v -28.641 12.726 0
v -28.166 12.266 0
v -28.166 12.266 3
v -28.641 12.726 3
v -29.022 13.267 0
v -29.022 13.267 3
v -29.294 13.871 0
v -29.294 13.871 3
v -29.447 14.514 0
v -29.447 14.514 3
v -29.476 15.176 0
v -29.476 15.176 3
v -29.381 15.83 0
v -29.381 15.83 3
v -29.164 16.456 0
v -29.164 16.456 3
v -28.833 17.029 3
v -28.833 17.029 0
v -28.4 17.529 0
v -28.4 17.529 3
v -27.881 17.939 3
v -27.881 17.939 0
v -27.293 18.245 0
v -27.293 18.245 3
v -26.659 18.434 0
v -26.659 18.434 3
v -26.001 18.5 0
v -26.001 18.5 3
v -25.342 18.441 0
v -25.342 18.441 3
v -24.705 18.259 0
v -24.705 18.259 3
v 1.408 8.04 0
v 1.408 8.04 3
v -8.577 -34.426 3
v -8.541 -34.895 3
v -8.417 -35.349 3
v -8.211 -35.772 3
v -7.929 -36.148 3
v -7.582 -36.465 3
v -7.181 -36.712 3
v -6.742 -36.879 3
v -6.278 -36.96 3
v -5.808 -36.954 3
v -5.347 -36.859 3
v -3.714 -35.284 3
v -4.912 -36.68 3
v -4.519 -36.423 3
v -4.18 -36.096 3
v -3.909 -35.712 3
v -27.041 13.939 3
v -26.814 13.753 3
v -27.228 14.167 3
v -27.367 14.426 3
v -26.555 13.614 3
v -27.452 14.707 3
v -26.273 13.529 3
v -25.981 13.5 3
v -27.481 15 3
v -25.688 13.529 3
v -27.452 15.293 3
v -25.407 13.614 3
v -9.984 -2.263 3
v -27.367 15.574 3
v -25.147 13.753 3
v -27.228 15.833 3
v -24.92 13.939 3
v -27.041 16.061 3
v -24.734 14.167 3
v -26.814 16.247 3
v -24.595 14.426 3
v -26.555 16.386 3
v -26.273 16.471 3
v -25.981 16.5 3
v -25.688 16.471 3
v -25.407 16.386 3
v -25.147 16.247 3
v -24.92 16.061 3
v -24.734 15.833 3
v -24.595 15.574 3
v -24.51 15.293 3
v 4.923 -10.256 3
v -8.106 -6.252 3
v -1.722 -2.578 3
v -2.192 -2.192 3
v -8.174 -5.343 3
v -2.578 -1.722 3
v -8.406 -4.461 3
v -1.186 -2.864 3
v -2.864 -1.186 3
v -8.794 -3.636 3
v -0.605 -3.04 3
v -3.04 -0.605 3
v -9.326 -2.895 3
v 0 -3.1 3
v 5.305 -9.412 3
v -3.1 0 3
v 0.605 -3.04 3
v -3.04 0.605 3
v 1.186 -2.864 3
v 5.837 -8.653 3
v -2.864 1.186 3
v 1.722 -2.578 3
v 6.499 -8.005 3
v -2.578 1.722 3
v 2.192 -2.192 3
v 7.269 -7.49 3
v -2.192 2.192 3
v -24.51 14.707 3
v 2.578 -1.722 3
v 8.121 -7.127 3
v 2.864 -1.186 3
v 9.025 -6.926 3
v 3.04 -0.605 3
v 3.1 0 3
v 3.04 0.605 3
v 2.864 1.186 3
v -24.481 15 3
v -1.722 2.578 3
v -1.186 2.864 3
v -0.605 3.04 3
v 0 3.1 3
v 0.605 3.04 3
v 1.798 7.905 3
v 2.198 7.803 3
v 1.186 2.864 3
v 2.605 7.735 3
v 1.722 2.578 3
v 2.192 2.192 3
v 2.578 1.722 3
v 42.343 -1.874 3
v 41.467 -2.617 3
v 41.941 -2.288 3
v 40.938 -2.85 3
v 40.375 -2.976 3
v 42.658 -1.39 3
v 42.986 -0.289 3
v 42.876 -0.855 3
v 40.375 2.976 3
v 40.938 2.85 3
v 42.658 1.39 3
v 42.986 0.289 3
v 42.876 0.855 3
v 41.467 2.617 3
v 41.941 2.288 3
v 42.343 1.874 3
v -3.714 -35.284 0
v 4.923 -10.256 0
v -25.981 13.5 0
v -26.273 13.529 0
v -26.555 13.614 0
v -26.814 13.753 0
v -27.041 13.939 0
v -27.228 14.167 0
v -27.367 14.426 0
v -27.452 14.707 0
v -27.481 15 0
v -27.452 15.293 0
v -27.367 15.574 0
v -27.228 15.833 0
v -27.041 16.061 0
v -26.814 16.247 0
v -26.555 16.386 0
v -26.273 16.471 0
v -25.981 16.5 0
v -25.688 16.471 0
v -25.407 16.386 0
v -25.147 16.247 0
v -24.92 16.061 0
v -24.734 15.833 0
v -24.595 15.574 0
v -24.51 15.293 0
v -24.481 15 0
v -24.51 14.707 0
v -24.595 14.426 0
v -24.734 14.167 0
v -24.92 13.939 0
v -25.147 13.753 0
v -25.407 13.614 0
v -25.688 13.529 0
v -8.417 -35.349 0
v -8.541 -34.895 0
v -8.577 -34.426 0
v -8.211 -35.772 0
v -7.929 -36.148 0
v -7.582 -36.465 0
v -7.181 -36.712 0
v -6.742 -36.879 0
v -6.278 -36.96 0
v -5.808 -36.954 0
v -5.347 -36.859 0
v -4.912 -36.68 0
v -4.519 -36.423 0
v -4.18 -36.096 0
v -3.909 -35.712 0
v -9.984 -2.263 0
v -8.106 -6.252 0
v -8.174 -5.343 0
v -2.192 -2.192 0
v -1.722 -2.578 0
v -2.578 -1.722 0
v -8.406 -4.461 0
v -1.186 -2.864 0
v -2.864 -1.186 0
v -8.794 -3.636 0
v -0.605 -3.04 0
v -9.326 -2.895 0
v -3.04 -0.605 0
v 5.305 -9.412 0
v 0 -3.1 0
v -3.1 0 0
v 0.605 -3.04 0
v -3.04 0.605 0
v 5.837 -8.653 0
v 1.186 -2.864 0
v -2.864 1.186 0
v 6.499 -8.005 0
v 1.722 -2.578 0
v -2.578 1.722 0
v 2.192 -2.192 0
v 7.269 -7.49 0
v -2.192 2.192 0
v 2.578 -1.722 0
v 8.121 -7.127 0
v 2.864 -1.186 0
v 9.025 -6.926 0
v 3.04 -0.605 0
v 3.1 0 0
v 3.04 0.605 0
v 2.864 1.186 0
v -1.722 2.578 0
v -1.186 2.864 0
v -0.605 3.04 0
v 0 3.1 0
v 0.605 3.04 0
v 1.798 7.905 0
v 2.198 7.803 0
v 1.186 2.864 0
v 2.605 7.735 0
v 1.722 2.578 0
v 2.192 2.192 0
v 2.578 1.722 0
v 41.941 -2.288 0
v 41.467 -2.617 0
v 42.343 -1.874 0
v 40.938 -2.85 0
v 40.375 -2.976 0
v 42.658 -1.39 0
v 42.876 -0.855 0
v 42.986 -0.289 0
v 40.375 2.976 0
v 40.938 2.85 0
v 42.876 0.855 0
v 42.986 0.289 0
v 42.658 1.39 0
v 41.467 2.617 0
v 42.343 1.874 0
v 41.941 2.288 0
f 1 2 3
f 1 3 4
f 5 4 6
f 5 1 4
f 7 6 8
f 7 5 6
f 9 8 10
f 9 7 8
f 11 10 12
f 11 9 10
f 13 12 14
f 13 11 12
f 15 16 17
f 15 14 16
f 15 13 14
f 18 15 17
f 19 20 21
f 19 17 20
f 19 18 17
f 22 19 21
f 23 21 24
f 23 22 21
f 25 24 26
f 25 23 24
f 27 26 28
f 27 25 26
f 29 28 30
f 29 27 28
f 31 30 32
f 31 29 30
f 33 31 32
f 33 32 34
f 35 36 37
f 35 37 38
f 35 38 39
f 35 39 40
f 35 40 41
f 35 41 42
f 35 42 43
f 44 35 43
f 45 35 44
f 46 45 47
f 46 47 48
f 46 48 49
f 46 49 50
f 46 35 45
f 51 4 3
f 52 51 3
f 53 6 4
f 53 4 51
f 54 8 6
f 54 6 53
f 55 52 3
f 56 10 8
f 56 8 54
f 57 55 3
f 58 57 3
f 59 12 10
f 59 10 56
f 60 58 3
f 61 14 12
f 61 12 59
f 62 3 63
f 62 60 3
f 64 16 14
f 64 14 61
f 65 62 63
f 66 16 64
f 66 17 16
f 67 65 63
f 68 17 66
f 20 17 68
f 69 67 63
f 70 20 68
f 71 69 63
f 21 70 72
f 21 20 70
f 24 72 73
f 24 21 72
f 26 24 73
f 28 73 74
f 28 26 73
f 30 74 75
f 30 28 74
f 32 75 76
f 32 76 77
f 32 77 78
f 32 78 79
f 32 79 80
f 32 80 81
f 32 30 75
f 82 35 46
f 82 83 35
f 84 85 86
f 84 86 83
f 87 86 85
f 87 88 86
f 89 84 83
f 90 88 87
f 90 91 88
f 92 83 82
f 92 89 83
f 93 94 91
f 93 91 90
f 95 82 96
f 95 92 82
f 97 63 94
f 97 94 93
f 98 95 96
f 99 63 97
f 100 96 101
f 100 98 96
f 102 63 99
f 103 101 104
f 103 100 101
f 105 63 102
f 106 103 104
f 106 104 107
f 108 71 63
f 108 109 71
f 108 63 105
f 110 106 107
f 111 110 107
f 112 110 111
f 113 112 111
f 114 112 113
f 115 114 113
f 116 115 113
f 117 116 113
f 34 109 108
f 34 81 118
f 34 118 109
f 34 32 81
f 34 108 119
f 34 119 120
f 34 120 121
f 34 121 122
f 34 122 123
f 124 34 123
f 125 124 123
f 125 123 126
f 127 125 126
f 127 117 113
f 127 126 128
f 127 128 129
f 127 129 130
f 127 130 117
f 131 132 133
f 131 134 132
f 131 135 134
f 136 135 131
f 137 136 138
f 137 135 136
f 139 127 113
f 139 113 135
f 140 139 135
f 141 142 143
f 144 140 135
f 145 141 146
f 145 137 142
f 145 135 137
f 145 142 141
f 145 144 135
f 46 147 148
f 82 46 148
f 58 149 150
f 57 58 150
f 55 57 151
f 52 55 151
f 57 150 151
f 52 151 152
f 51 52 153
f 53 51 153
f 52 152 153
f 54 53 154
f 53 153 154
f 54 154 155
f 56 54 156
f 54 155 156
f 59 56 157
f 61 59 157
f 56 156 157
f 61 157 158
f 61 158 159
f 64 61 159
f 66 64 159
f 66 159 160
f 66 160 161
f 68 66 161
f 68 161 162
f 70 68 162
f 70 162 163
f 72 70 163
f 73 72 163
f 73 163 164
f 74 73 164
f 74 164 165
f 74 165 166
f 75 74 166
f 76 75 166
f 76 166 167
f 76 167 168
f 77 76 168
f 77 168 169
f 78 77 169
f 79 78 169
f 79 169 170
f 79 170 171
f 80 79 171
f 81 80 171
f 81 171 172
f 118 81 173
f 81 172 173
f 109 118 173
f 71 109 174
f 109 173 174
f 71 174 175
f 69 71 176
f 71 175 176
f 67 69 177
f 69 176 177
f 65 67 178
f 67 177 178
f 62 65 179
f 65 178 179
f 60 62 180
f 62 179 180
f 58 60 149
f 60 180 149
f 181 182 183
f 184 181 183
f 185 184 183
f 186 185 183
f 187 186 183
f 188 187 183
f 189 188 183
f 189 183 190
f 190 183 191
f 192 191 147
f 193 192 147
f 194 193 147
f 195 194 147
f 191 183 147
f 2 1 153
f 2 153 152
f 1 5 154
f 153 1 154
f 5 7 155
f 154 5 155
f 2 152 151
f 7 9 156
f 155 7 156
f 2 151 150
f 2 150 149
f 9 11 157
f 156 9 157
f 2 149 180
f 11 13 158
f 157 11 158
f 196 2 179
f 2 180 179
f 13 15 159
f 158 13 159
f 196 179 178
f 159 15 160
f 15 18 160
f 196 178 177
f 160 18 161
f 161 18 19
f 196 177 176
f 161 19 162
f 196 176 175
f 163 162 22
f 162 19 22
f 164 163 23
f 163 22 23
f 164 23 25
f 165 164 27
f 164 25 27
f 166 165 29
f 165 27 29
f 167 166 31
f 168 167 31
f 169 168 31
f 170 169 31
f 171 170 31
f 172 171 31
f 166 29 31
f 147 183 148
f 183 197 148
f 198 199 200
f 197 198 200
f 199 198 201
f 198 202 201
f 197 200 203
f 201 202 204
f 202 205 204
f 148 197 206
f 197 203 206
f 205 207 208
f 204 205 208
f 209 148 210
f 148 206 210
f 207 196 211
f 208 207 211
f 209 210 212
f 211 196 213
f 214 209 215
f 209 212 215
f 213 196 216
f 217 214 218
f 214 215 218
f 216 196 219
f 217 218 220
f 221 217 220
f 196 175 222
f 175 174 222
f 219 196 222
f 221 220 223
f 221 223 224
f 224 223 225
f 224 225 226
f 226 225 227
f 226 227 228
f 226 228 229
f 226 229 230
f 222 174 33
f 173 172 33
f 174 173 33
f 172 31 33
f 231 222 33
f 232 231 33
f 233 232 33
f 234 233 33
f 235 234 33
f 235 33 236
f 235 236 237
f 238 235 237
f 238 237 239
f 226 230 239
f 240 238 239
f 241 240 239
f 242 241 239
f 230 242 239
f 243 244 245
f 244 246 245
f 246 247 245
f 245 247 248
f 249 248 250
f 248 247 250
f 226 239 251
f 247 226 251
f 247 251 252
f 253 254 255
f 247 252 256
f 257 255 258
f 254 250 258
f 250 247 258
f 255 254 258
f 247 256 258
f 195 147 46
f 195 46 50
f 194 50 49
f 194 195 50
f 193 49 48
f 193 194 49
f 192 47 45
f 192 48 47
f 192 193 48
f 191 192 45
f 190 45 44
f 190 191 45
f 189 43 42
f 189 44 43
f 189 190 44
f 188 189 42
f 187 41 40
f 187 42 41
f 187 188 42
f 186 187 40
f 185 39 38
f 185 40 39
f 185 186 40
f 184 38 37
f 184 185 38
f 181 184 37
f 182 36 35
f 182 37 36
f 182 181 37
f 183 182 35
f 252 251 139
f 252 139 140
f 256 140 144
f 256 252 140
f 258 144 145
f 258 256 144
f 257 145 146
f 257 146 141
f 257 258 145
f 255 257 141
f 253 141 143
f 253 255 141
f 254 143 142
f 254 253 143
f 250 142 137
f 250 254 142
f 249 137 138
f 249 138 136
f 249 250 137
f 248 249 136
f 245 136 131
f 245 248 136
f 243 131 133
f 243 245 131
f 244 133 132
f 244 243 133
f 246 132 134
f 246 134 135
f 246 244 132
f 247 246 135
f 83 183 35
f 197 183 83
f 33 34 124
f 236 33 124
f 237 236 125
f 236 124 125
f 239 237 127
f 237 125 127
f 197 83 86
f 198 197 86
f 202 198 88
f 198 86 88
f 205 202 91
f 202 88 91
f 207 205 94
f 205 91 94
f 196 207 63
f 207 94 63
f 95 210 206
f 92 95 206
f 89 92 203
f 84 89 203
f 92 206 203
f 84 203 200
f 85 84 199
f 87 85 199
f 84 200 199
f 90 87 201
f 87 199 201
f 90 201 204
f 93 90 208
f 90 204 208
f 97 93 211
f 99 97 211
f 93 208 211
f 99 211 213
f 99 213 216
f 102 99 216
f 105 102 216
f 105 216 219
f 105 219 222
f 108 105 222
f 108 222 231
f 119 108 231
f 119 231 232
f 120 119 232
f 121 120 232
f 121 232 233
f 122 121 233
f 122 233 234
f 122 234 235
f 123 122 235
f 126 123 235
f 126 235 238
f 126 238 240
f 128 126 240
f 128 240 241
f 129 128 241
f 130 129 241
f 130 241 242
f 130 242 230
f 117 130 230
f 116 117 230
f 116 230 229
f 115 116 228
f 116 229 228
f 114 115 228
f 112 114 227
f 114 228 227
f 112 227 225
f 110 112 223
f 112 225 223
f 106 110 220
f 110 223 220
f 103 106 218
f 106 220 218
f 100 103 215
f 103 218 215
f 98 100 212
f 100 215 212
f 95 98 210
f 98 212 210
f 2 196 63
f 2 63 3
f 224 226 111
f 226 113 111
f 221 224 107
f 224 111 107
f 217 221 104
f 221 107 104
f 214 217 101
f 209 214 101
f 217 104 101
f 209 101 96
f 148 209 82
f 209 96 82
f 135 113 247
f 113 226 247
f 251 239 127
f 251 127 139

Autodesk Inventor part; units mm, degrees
ref_plane "YZ Plane" through (0, 0, 0) normal (1, 0, 0) x (0, 1, 0)
ref_plane "XZ Plane" through (0, 0, 0) normal (0, 1, 0) x (-1, 0, 0)
ref_plane "XY Plane" through (0, 0, 0) normal (0, 0, 1) x (1, 0, 0)
sketch "Sketch1" plane through (0, 0, 0) normal (0, 0, 1) x (1, 0, 0)
  circle A0 centre (0, 0) radius 8
  line L0 (1, 7.9373) -> (40.375, 2.9765)
  line L1 (1, -7.9373) -> (40.375, -2.9765)
  line L2 (0, 0) -> (40, 0) construction
  circle A1 centre (40, 0) radius 3
  circle A2 centre (-6.0777, -34.4683) radius 2.5
  line L3 (-3.7145, -35.2839) -> (7.5623, -2.61)
  line L4 (-8.5773, -34.4264) -> (-7.9989, 0.1339)
  line L5 (0, 0) -> (-6.0777, -34.4683) construction
  circle A3 centre (-25.9808, 15) radius 3.5
  line L6 (-24.7052, 18.2593) -> (2.9155, 7.4498)
  line L7 (-4.994, -6.2498) -> (-28.1656, 12.2657)
  line L8 (-25.9808, 15) -> (0, 0) construction
  point P0 (-3.8416, -33.3502)
  dimension "d0" = 16
  dimension "d1" = 6
  dimension "d2" = 40
  dimension "d3" = 5
  dimension "d4" = 35
  dimension "d5" = 100
  dimension "d32" = 18.082
  dimension "d36" = 30
  dimension "d37" = 7
  dimension "d38" = 150
extrude "Extrusion1" add sketch "Sketch1" along normal blind 3
fillet "Fillet1" radius 5 3 edges at (5.9384, -7.3151, 1.5) (1.9881, 7.8128, 1.5) (-8.0647, -3.7962, 1.5)
sketch "Sketch2" plane through (0, 0, 3) normal (0, 0, 1) x (1, 0, 0)
  point P0 (0, 0)
  point P1 (0, 0)
hole "Hole1" at (0, 0, 3) direction (0, 0, -1) diameter 6.2 end through all
sketch "Sketch3" plane through (0, 0, 3) normal (0, 0, 1) x (1, 0, 0)
  line L0 (-8.1058, -6.2524) -> (-8.5773, -34.4264) projected
  line L1 (-3.7145, -35.2839) -> (4.9235, -10.2558) projected
  point P0 (0, 0)
  point P1 (-3.473, -19.6962)
  point P2 (-7.4498, 2.9155)
  point P3 (-8.5773, -34.4264)
  point P4 (-9.2276, -1.6271)
  dimension "d33" = 20
  dimension "d34" = 4.8571
  dimension "d35" = 4.8571
hole "Hole2" [suppressed]
sketch "Sketch4" plane through (0, 0, 3) normal (0, 0, 1) x (1, 0, 0)
  arc A0 (-8.5773, -34.4264) -> (-3.7145, -35.2839) centre (-6.0777, -34.4683) ccw projected
  arc A1 (-24.7052, 18.2593) -> (-28.1656, 12.2657) centre (-25.9808, 15) ccw projected
  point P0 (0, 0)
hole "Hole3" at (-25.9808, 15, 3) direction (0, 0, -1) diameter 3 end through all
equation "\"d34\" = d35"
properties part number "Pancake_Switch Lever 2" material "Nylon 6/6"
